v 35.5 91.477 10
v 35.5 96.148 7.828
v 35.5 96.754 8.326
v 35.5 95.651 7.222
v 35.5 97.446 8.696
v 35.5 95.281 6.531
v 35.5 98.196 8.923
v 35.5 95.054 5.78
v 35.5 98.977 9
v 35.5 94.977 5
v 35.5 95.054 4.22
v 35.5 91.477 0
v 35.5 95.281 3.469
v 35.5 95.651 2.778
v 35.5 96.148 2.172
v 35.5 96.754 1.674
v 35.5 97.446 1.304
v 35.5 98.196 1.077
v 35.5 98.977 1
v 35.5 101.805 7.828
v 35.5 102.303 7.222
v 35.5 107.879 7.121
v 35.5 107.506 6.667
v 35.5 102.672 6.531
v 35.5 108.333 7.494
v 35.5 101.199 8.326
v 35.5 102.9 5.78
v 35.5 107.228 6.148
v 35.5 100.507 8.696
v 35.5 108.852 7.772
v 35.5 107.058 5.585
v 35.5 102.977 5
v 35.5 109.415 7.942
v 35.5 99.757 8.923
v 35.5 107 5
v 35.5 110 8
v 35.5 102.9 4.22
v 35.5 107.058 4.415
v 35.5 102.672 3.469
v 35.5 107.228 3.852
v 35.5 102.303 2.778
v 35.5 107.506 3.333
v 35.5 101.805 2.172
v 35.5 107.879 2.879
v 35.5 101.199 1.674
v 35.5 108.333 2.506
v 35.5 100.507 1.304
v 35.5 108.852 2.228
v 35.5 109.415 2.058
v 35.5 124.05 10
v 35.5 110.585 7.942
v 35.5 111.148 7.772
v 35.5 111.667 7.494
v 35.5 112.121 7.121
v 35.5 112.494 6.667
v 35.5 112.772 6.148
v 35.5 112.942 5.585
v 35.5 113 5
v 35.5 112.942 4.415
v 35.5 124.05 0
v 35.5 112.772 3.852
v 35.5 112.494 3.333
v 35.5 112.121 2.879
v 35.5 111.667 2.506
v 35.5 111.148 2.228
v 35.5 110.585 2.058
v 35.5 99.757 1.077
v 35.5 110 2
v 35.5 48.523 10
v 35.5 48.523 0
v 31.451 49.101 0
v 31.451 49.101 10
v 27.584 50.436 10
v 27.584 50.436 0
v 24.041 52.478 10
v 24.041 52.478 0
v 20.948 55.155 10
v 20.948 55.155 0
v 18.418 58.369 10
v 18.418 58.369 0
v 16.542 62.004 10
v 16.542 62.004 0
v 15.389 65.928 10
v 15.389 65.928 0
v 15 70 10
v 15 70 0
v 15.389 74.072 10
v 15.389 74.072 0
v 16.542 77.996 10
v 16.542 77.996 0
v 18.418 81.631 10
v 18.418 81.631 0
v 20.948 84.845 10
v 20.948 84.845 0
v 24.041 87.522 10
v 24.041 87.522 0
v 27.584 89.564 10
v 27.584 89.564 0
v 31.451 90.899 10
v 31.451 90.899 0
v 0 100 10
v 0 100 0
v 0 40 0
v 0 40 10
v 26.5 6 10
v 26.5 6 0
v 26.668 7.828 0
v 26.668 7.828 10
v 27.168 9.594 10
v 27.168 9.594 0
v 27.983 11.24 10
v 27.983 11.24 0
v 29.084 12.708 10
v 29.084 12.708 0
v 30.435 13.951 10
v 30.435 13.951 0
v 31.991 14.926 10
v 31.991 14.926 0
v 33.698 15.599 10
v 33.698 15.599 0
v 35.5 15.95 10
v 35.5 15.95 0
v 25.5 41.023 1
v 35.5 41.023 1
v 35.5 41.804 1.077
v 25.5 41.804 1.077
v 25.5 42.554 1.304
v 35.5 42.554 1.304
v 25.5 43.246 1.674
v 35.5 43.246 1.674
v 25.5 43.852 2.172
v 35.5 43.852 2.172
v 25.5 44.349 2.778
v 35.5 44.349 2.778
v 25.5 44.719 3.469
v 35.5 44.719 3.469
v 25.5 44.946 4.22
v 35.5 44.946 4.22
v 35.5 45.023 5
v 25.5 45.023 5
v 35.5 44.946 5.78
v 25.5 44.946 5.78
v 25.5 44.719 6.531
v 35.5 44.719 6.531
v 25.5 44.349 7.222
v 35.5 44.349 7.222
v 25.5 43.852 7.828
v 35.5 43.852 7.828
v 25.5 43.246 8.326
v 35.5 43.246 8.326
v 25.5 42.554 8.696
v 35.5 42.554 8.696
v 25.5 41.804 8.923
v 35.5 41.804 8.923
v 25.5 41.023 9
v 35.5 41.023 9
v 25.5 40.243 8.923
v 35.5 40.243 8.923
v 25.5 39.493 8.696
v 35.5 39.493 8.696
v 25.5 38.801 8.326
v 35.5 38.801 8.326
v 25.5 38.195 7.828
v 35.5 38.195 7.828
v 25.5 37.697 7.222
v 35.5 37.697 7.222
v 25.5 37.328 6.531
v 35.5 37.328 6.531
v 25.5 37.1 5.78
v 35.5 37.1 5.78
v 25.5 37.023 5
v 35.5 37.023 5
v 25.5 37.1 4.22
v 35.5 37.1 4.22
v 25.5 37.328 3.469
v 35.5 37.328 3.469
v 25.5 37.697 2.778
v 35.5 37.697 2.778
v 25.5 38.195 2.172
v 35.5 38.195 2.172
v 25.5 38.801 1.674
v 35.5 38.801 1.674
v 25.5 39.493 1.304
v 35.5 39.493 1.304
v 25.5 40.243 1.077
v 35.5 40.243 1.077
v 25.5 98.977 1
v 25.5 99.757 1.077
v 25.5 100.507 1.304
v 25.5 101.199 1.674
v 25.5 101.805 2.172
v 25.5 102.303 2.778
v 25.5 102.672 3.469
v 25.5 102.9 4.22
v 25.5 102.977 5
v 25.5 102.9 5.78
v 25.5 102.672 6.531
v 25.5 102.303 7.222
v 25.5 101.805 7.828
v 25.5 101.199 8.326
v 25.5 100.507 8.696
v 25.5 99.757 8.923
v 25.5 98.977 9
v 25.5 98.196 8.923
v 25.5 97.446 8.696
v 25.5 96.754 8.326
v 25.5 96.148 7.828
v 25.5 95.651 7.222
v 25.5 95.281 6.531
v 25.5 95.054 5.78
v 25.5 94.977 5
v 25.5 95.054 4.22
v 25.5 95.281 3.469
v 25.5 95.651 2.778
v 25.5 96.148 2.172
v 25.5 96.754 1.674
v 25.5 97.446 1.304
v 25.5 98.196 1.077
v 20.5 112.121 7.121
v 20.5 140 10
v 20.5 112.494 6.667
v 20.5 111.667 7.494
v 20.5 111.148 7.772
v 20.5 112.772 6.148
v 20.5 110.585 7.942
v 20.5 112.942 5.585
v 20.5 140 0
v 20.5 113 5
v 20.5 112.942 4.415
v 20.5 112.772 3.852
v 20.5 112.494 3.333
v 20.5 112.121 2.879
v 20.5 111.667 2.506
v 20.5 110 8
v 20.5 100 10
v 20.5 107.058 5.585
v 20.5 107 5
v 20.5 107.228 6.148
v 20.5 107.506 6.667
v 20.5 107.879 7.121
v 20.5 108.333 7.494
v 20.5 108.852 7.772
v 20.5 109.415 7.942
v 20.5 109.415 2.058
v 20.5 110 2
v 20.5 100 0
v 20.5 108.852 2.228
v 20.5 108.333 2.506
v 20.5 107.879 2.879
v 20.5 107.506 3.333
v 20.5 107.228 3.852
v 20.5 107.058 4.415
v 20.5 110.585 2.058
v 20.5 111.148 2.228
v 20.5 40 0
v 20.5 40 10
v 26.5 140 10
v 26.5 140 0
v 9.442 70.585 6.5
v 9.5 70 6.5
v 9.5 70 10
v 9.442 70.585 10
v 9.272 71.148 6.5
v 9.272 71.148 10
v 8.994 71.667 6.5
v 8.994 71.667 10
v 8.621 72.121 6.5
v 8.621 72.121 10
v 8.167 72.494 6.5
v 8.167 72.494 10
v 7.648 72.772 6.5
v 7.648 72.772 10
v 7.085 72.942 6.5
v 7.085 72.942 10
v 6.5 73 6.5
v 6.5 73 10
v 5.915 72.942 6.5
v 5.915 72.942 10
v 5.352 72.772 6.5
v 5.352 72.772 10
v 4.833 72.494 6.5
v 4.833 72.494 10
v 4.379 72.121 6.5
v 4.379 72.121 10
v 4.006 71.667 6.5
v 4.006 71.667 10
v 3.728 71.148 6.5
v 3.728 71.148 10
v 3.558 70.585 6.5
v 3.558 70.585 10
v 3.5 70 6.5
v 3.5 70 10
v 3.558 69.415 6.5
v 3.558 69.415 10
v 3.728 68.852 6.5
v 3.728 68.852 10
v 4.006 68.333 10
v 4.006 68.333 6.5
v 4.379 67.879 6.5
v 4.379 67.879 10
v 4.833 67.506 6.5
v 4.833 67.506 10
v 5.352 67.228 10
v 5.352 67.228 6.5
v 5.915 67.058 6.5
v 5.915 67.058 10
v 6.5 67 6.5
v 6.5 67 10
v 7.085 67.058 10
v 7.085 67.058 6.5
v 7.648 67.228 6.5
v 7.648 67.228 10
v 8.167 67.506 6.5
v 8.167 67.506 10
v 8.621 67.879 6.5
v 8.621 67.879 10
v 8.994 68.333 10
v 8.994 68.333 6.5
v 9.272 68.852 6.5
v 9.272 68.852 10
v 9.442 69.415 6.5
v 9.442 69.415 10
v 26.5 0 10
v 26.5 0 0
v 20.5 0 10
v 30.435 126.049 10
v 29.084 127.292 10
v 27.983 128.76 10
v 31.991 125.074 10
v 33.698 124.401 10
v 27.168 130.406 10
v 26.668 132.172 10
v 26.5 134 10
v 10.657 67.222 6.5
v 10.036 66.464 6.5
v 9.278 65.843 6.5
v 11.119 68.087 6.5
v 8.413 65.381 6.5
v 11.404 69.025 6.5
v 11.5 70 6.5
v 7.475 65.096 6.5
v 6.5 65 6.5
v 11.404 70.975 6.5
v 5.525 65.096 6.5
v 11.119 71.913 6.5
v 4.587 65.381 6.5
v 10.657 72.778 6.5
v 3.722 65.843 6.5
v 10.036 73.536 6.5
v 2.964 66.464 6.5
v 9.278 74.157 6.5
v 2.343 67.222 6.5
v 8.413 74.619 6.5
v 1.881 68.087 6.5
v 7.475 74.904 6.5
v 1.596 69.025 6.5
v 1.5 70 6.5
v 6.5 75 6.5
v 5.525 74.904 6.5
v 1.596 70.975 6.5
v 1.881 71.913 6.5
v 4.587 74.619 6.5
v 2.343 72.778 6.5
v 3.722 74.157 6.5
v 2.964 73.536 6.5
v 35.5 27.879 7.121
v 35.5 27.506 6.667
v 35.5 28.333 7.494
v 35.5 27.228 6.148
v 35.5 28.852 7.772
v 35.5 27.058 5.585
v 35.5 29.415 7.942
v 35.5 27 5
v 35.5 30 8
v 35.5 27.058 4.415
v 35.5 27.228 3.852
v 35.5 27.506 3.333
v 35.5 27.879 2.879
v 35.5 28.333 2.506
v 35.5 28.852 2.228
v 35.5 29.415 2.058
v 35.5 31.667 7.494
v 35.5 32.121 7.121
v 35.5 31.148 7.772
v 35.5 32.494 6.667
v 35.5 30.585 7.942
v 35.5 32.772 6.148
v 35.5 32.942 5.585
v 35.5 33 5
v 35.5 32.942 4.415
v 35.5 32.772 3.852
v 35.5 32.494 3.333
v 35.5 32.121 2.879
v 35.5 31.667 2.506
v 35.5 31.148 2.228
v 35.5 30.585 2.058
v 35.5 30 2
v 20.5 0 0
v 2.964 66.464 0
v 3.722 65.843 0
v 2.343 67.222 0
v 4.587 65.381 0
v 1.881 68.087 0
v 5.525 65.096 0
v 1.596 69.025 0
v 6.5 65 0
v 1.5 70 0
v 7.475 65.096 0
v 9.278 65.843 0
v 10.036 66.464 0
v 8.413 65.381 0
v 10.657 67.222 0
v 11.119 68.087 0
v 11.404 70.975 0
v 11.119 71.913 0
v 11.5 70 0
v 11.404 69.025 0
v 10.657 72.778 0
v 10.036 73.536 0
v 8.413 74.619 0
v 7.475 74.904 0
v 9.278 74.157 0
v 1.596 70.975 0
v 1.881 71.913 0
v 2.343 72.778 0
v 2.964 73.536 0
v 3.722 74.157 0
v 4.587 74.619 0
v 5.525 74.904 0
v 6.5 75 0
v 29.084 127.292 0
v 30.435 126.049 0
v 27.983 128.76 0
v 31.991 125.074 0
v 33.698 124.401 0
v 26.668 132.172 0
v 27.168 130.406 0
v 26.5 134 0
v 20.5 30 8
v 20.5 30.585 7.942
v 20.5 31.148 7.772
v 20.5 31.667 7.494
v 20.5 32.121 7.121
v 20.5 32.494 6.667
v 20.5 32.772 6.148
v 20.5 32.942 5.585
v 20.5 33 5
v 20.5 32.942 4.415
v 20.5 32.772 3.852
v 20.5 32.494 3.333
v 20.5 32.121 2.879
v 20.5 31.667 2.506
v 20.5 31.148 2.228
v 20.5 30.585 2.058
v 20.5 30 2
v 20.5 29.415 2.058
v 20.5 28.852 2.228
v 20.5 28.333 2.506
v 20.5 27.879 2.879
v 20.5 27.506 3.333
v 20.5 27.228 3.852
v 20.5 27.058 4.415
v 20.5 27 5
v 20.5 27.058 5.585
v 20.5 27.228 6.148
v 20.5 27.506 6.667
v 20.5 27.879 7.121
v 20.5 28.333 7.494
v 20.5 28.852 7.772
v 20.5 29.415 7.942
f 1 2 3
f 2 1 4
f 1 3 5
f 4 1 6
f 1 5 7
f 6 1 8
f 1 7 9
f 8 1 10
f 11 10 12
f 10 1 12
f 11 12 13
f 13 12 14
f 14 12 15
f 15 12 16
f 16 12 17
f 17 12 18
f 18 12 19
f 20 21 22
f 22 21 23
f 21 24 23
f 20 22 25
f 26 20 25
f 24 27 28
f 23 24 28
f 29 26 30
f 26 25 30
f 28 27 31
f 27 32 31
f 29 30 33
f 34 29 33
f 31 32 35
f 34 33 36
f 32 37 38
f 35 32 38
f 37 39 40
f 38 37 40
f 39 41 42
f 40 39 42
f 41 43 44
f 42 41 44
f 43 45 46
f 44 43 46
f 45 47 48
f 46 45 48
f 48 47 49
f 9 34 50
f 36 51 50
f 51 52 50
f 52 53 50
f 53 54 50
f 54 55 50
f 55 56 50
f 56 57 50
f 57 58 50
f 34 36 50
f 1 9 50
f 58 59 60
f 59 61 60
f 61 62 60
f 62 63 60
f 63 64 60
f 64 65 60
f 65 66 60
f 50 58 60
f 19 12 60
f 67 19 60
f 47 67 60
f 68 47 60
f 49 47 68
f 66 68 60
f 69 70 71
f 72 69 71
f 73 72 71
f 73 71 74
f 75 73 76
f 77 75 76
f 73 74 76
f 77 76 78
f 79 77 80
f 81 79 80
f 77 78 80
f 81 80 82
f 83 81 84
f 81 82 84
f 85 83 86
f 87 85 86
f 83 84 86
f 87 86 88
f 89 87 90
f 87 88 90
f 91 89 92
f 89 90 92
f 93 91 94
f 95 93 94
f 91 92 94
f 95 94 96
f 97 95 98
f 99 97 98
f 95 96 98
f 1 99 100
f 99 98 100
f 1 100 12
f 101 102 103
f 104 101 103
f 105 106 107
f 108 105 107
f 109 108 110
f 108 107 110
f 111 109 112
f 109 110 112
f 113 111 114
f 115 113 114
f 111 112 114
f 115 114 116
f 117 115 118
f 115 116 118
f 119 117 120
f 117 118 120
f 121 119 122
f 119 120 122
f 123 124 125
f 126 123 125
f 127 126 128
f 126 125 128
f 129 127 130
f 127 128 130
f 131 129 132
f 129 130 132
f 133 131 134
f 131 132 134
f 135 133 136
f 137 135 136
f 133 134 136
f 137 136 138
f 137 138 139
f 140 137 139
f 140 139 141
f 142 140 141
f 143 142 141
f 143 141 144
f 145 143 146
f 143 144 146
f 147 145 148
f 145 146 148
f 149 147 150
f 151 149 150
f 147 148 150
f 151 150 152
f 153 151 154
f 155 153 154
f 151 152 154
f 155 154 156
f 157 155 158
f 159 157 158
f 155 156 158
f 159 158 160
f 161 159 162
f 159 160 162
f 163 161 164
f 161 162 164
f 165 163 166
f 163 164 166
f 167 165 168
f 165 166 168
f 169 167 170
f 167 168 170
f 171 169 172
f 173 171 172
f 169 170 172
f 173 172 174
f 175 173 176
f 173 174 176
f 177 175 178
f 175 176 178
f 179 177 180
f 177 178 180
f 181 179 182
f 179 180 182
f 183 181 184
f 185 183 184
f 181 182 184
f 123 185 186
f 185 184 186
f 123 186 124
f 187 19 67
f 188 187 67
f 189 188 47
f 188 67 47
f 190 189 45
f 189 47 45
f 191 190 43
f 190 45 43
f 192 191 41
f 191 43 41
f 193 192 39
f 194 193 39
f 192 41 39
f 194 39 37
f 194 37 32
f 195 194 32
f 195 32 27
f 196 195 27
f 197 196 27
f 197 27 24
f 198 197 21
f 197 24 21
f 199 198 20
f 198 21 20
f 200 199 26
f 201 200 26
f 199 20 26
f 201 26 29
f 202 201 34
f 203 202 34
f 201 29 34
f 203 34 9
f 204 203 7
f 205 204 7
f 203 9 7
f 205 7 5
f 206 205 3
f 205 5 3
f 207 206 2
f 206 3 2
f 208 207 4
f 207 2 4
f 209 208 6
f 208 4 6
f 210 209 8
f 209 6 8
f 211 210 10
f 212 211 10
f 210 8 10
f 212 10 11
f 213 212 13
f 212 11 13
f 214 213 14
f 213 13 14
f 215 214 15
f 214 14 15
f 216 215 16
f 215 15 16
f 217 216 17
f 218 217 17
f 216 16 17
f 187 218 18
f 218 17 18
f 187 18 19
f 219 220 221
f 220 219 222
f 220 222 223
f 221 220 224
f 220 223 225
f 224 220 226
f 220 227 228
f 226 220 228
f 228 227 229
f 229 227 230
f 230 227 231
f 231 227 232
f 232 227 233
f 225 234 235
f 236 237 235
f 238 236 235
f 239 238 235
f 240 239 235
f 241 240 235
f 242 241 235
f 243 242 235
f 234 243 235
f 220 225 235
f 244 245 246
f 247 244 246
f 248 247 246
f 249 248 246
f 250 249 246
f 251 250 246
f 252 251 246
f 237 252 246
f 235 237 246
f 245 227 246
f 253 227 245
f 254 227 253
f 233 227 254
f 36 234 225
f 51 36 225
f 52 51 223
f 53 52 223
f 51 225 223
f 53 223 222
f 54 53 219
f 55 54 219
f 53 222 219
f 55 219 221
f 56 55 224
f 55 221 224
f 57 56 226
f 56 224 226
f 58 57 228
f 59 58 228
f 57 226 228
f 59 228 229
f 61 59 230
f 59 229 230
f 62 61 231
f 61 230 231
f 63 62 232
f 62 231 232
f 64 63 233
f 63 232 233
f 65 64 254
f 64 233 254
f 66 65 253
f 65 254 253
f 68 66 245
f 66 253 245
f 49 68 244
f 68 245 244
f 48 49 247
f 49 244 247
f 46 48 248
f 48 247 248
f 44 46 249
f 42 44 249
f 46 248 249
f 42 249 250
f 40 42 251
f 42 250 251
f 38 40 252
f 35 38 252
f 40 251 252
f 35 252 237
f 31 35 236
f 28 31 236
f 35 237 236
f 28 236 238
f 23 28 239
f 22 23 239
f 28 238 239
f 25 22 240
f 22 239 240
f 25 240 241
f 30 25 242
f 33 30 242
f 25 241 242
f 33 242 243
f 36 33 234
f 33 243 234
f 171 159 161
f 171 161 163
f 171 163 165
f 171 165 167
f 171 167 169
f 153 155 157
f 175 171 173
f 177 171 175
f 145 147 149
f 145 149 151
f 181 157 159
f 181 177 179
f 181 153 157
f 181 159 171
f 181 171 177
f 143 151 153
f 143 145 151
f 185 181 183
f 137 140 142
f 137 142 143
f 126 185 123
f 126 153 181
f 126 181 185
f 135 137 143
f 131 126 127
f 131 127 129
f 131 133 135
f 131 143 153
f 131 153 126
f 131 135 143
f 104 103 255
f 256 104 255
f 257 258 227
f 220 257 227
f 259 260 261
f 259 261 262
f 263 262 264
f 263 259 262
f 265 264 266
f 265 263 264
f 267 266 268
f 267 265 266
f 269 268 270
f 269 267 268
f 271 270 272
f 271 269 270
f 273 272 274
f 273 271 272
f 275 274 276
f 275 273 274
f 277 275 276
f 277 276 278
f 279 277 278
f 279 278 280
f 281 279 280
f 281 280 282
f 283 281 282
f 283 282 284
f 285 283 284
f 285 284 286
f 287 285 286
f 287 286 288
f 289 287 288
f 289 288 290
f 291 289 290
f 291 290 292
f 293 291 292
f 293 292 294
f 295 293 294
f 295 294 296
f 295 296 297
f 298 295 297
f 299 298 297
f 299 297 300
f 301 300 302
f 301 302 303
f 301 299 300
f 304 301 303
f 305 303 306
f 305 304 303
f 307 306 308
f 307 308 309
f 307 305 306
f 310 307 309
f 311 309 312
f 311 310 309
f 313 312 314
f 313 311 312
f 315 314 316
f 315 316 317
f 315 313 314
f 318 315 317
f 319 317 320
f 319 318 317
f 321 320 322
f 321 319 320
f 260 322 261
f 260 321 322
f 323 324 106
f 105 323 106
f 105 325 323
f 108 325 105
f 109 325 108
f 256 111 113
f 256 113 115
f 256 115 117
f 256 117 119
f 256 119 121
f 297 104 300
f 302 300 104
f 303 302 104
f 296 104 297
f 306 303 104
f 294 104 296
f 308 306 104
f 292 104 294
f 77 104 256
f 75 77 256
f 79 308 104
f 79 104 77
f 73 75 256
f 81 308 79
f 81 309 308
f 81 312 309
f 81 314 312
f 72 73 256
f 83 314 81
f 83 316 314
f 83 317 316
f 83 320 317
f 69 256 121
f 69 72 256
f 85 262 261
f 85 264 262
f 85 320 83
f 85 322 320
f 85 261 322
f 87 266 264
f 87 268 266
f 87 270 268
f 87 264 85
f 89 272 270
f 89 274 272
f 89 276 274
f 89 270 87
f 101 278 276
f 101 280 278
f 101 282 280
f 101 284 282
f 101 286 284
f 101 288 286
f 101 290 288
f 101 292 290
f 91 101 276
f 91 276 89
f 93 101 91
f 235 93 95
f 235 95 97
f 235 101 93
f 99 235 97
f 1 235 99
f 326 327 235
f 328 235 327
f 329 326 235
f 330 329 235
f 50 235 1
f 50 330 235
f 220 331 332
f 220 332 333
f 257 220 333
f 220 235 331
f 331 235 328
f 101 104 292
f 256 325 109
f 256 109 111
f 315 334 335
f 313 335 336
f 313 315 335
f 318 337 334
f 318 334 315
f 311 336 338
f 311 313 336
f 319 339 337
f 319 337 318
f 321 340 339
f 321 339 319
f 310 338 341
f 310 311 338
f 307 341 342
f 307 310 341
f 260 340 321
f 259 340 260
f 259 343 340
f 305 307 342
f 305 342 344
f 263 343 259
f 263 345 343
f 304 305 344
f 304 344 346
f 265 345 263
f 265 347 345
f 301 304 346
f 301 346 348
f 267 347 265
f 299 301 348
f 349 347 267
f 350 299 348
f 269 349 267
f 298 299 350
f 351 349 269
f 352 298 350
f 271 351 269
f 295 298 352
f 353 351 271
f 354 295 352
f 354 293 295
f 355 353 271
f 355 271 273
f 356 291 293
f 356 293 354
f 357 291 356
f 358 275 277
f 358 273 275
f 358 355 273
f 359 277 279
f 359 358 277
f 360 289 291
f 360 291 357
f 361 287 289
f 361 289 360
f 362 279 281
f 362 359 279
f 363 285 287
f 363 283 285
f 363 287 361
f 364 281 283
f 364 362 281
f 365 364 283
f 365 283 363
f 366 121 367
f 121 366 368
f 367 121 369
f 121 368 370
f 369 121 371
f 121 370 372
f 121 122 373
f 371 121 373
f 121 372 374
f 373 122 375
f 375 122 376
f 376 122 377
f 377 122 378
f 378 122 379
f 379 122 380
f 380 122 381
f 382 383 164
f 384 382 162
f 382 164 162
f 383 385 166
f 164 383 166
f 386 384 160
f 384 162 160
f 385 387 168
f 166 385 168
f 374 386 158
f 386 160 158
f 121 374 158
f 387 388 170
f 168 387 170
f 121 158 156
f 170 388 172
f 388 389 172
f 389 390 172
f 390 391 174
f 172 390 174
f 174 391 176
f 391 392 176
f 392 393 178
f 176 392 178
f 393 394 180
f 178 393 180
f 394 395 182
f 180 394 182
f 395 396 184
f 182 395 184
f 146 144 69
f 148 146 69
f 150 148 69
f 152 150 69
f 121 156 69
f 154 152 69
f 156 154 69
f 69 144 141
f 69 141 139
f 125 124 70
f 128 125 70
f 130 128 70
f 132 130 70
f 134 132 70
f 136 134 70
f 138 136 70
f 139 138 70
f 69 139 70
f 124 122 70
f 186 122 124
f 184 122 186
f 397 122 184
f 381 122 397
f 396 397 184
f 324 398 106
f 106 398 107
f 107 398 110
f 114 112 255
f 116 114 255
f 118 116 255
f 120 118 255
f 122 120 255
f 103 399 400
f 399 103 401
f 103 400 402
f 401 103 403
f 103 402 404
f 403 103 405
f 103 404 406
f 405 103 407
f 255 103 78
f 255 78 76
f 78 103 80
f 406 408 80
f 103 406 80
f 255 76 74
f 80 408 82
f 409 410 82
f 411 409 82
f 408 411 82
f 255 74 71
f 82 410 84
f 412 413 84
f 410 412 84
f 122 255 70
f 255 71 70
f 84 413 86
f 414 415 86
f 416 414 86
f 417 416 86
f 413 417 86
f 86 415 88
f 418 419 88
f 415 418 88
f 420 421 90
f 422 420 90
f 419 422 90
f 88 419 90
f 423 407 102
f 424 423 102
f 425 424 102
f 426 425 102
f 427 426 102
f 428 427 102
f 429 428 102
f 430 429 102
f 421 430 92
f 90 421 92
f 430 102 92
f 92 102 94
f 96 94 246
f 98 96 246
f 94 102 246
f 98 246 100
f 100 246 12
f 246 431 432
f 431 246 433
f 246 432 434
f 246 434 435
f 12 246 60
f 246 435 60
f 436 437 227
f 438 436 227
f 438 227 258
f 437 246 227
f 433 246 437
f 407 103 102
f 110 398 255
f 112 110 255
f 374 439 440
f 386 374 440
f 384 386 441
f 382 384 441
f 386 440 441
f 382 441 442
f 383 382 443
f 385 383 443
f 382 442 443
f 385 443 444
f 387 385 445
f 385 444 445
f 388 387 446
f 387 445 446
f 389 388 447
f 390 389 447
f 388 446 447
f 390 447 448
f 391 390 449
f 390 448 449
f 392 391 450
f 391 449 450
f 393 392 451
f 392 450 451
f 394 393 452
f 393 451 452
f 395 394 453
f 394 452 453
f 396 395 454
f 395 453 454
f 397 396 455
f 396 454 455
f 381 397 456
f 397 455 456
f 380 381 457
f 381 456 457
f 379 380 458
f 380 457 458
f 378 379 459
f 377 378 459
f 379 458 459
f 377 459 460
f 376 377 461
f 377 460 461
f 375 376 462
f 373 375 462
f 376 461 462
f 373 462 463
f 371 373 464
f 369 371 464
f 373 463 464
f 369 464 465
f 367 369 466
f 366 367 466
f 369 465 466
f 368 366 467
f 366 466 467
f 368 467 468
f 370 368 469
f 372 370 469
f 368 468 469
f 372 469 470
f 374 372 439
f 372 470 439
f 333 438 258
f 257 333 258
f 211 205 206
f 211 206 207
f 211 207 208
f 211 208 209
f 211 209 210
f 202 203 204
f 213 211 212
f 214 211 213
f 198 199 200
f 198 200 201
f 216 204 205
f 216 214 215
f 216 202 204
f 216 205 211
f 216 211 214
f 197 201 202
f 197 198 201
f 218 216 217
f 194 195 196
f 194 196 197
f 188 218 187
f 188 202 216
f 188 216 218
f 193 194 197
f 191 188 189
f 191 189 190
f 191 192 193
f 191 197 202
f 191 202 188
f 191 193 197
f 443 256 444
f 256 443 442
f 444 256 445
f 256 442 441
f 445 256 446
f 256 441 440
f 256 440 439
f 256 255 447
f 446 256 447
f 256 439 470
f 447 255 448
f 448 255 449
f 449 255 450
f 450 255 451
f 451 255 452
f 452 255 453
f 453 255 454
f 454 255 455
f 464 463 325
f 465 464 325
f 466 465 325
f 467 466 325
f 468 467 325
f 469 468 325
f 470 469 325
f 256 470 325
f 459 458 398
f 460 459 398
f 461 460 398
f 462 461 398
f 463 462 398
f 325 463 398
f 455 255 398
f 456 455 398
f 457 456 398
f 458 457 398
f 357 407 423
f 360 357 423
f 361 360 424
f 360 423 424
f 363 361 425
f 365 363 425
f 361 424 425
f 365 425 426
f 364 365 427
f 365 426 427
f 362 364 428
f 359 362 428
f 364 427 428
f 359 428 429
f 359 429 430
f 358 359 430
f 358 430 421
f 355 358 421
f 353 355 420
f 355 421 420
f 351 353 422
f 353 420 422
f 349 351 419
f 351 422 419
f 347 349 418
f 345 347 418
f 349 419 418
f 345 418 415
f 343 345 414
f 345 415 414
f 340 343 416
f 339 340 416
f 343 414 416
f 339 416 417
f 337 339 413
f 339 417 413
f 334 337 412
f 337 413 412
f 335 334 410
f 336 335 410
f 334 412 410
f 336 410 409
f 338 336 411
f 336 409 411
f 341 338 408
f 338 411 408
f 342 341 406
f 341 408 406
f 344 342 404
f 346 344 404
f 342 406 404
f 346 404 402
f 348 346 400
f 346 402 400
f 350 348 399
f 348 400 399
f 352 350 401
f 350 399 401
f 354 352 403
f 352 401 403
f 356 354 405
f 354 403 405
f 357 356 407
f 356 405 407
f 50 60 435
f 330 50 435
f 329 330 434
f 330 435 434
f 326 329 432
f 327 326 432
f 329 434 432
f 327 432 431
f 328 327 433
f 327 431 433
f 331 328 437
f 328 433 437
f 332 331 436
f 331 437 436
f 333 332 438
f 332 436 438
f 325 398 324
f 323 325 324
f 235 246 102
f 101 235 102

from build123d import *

# Parameters (mm, degrees)
SKETCH1_R           = 3
EXTRUDE3_DEPTH      = 10
SKETCH6_R           = 5
CUT_EXTRUDE4_DEPTH  = 6.5
SKETCH7_R           = 3
CUT_EXTRUDE5_DEPTH  = 15
SKETCH9_R           = 3
CUT_EXTRUDE10_DEPTH = 15
SKETCH12_R          = 4
CUT_EXTRUDE13_DEPTH = 10


with BuildPart() as part:
    # Sketch1 → Extrude3 (new body)
    with BuildSketch(Plane.XY):
        with BuildLine():
            Line((26.5, 134), (26.5, 140))
            Line((26.5, 140), (20.5, 140))
            Line((20.5, 140), (20.5, 100))
            Line((20.5, 100), (5.5, 100))
            Line((5.5, 100), (0, 100))
            Line((0, 100), (0, 40))
            Line((0, 40), (5.5, 40))
            Line((5.5, 40), (20.5, 40))
            Line((20.5, 40), (20.5, 0))
            Line((20.5, 0), (26.5, 0))
            Line((26.5, 0), (26.5, 6))
            ThreePointArc((26.5, 6), (29.083801513, 12.708203932), (35.5, 15.949874371))
            Line((35.5, 15.949874371), (35.5, 40))
            Line((35.5, 40), (35.5, 48.523268405))
            ThreePointArc((35.5, 48.523268405), (15, 70), (35.5, 91.476731595))
            Line((35.5, 91.476731595), (35.5, 100))
            Line((35.5, 100), (35.5, 124.050125629))
            ThreePointArc((35.5, 124.050125629), (29.083801513, 127.291796068), (26.5, 134))
        make_face()
        with Locations((6.5, 70)):
            Circle(SKETCH1_R, mode=Mode.SUBTRACT)
    extrude(amount=EXTRUDE3_DEPTH)

    # Sketch6 → Cut-Extrude4 (cut)
    with BuildSketch(Plane(origin=(0, 0, 0), x_dir=(-1, 0, 0), z_dir=(0, 0, -1))):
        with Locations((-6.5, 70)):
            Circle(SKETCH6_R)
    extrude(amount=-CUT_EXTRUDE4_DEPTH, mode=Mode.SUBTRACT)

    # Sketch7 → Cut-Extrude5 (cut)
    with BuildSketch(Plane.ZY.offset(-20.5)):
        with Locations((5, 30)):
            Circle(SKETCH7_R)
    extrude(amount=-CUT_EXTRUDE5_DEPTH, mode=Mode.SUBTRACT)

    # Sketch9 → Cut-Extrude10 (cut)
    with BuildSketch(Plane.ZY.offset(-20.5)):
        with Locations((5, 110)):
            Circle(SKETCH9_R)
    extrude(amount=-CUT_EXTRUDE10_DEPTH, mode=Mode.SUBTRACT)

    # Sketch12 → Cut-Extrude13 (cut)
    with BuildSketch(Plane(origin=(35.5, 0, 0), x_dir=(0, 0, -1), z_dir=(1, 0, 0))):
        with Locations((-5, 98.976731595)):
            Circle(SKETCH12_R)
        with Locations((-5, 41.023268405)):
            Circle(SKETCH12_R)
    extrude(amount=-CUT_EXTRUDE13_DEPTH, mode=Mode.SUBTRACT)


solid = part.part
